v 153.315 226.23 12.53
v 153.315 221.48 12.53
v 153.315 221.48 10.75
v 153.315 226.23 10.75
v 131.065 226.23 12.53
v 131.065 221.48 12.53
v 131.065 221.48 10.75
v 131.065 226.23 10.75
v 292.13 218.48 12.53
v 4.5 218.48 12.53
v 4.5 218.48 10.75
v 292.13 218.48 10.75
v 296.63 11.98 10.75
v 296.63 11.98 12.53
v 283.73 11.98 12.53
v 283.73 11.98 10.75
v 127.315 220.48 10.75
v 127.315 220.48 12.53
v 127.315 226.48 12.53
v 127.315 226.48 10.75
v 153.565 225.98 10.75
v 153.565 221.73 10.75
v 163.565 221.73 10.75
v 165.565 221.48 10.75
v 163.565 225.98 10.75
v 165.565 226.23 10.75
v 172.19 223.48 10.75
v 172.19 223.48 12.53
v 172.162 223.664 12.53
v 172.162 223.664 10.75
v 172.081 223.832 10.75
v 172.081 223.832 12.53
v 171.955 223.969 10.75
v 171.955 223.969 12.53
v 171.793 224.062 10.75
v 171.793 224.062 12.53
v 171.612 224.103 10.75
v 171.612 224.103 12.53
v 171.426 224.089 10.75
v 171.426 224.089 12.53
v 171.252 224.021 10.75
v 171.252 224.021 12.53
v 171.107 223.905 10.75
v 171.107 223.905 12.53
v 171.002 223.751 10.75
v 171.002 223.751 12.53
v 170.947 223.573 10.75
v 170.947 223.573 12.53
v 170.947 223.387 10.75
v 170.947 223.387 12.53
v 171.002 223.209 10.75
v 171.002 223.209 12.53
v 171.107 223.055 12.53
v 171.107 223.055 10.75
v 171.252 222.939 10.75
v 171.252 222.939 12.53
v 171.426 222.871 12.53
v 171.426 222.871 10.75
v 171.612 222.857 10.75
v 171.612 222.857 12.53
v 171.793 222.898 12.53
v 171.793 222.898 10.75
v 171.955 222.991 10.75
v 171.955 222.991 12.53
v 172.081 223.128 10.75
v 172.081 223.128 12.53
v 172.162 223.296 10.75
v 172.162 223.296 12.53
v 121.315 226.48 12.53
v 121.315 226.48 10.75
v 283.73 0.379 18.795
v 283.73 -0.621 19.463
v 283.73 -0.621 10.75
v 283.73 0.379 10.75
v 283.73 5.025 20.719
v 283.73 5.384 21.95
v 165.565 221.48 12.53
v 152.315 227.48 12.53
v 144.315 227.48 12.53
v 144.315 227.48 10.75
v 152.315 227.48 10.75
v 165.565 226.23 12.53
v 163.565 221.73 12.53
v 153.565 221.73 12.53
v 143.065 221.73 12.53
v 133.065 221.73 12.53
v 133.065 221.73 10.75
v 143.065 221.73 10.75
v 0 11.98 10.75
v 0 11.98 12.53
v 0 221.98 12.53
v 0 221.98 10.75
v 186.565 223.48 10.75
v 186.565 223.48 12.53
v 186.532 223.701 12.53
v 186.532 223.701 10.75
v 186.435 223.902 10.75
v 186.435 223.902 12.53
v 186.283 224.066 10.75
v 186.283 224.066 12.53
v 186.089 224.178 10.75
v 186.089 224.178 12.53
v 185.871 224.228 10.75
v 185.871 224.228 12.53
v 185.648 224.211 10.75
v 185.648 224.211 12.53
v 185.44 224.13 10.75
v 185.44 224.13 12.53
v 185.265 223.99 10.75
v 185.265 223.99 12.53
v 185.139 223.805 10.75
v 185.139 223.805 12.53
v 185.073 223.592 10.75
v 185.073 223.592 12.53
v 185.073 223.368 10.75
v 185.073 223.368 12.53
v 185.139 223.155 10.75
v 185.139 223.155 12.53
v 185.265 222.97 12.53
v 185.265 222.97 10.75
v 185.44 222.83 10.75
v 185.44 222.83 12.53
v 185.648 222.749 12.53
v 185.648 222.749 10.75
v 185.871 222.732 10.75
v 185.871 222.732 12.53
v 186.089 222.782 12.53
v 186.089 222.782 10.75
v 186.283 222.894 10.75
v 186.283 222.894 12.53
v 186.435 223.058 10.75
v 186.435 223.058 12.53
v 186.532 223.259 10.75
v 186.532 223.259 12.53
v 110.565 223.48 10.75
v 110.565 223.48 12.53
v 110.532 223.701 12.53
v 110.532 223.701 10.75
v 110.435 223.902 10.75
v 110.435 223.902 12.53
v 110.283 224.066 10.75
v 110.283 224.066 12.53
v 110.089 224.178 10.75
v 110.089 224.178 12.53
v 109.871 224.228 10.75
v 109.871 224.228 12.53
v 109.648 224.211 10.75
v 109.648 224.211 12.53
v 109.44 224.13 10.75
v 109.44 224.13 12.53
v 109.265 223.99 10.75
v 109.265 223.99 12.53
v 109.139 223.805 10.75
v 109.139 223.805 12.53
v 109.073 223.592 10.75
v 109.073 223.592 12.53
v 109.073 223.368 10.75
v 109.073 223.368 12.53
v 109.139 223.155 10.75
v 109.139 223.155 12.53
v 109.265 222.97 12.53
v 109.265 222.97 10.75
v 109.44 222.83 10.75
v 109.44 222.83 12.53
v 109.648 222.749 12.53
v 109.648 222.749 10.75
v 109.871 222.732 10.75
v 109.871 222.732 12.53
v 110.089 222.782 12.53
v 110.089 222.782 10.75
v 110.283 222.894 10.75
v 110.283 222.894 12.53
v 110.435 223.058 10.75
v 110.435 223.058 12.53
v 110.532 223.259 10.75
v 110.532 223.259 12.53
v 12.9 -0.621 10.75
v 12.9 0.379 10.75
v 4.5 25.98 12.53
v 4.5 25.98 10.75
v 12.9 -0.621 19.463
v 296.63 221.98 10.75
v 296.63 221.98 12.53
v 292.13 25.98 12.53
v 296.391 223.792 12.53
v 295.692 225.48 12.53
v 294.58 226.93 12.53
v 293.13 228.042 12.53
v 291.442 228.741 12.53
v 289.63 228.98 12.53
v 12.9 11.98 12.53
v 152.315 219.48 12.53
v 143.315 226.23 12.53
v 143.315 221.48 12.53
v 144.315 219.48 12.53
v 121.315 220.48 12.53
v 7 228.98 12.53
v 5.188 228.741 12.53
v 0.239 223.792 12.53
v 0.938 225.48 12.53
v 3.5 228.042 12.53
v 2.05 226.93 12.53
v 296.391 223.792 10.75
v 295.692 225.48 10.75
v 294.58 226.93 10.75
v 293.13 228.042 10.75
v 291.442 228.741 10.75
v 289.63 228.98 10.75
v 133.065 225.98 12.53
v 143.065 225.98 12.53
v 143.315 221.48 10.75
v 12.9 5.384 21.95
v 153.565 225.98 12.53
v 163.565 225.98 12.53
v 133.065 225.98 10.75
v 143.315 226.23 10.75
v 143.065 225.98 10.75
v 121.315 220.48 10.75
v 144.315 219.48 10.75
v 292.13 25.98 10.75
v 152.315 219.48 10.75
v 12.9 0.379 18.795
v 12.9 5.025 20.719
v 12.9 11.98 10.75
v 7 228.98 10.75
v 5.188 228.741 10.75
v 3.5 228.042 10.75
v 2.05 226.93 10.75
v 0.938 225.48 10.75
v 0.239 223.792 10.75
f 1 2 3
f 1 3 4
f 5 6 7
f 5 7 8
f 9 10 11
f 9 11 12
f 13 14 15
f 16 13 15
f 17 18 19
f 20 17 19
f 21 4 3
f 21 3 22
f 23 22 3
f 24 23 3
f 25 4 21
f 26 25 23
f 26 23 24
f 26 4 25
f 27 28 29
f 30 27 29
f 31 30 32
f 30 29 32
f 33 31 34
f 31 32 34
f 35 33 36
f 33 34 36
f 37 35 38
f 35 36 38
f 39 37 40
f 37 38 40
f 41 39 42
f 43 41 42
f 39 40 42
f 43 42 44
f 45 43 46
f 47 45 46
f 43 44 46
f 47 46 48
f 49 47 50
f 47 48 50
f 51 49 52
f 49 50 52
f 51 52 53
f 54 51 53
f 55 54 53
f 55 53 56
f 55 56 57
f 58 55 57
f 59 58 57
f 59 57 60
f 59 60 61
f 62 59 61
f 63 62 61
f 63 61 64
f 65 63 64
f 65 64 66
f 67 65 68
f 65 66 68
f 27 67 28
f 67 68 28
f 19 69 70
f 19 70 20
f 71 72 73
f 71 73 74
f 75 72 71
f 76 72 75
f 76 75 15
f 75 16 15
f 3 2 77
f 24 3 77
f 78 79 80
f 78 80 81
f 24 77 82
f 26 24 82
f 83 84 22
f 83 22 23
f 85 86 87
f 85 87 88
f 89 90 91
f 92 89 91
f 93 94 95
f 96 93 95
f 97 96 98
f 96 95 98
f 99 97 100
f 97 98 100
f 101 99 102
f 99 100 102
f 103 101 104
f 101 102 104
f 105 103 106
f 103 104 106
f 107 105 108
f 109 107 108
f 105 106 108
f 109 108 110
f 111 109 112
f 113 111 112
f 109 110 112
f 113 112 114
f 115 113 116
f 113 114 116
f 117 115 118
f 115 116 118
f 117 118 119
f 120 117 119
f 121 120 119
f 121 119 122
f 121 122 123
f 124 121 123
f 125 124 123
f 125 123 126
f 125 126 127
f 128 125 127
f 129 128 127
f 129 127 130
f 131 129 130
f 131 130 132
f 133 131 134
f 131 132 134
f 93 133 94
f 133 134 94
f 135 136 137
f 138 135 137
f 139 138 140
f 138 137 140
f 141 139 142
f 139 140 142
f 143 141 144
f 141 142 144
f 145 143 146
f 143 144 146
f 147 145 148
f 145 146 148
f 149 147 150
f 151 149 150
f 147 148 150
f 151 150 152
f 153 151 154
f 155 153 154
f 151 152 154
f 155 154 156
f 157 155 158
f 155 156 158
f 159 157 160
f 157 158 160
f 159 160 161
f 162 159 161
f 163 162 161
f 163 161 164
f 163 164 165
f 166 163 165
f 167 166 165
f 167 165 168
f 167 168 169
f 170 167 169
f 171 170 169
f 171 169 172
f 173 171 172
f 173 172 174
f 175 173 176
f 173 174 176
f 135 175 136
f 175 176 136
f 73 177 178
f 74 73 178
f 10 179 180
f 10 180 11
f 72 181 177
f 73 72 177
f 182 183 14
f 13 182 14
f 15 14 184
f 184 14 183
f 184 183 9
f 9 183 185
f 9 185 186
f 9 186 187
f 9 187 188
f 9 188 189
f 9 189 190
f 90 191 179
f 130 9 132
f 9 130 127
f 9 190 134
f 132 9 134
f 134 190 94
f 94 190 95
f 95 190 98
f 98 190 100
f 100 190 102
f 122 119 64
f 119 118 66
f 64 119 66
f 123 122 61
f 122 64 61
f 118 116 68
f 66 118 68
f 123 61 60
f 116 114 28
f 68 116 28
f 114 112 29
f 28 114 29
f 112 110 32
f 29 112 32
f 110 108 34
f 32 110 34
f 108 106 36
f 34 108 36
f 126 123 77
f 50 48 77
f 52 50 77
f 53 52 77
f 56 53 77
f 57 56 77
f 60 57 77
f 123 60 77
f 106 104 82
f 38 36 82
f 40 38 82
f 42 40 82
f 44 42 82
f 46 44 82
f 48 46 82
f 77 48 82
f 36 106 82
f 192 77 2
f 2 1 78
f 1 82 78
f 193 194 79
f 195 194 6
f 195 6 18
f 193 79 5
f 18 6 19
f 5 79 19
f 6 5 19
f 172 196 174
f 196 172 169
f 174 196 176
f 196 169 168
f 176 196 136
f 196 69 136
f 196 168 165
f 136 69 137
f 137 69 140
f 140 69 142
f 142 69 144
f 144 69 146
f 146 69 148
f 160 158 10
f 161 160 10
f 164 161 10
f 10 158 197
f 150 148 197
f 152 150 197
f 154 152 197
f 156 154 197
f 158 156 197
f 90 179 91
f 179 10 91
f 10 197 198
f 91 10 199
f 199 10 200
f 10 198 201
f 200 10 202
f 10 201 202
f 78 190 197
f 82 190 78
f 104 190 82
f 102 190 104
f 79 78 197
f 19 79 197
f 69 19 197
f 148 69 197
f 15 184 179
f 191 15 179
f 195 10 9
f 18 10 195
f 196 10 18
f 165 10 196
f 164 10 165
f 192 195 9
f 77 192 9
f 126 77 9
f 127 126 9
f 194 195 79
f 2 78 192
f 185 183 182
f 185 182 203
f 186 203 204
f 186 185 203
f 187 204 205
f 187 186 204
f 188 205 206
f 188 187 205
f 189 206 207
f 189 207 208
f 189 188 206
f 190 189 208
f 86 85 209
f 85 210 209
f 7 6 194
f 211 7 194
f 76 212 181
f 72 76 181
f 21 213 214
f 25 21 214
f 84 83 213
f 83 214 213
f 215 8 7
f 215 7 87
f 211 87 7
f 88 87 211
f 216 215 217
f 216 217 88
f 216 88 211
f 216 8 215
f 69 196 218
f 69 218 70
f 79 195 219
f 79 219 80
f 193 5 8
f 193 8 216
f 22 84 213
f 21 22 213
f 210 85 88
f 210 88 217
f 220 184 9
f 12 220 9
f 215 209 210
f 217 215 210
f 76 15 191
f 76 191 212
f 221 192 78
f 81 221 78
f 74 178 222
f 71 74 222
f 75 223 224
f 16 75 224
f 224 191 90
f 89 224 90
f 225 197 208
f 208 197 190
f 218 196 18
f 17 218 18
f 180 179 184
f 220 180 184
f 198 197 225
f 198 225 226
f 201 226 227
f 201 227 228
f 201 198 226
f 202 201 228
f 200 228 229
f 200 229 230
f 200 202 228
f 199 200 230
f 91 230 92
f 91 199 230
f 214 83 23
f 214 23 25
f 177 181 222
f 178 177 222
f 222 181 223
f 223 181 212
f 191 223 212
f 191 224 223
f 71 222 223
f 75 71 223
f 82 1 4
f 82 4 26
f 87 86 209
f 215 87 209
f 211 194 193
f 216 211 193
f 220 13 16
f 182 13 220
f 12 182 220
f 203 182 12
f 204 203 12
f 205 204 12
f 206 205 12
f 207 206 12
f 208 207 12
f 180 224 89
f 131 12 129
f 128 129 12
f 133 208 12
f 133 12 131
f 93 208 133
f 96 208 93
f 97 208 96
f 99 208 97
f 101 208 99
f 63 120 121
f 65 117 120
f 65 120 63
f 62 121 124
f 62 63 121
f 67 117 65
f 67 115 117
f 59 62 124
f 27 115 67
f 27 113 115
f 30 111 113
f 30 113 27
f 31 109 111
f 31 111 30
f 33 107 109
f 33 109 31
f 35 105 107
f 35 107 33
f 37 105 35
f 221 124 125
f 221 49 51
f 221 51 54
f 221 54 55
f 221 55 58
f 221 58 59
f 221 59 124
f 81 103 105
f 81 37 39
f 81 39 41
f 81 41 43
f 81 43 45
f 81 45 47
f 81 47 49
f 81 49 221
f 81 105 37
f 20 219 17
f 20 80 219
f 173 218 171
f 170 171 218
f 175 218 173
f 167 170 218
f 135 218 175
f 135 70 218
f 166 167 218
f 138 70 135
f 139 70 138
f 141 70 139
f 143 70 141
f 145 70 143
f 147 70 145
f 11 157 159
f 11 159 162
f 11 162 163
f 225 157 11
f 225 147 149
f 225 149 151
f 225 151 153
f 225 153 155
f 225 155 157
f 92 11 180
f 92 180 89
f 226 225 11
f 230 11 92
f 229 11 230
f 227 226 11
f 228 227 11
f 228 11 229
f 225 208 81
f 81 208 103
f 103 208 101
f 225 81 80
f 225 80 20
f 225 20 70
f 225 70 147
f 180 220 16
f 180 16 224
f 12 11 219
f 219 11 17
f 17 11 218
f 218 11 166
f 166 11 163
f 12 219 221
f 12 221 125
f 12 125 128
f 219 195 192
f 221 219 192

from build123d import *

# Parameters (mm, degrees)
SKETCH009_R   = 0.625
SKETCH009_R_2 = 0.75
SKETCH009_W   = 287.63
SKETCH009_H   = 192.5
SKETCH009_W_2 = 8
SKETCH009_H_2 = 8
SKETCH009_W_3 = 6
SKETCH009_H_3 = 6
PAD002_DEPTH  = 1.78
SKETCH_W      = 12.25
SKETCH_H      = 4.75
SKETCH_W_2    = 10
SKETCH_H_2    = 4.25
POCKET_DEPTH  = 1.7799
PAD_START     = 12.9
PAD_DEPTH     = 270.83


with BuildPart() as part:
    # Sketch009 → Pad002 (new body)
    with BuildSketch(Plane.XY.offset(12.53)):
        with BuildLine():
            Line((7, 228.98), (289.63, 228.98))
            ThreePointArc((296.63, 221.98), (294.579747, 226.929747), (289.63, 228.98))
            Line((296.63, 221.98), (296.63, 11.98))
            Line((296.63, 11.98), (0, 11.98))
            Line((0, 11.98), (0, 221.98))
            ThreePointArc((7, 228.98), (2.050253, 226.929747), (0, 221.98))
        make_face()
        with Locations((171.565, 223.48)):
            Circle(SKETCH009_R, mode=Mode.SUBTRACT)
        with Locations((185.815, 223.48)):
            Circle(SKETCH009_R_2, mode=Mode.SUBTRACT)
        with Locations((109.815, 223.48)):
            Circle(SKETCH009_R_2, mode=Mode.SUBTRACT)
        with Locations((148.315, 122.23)):
            Rectangle(SKETCH009_W, SKETCH009_H, mode=Mode.SUBTRACT)
        with Locations((148.315, 223.48)):
            Rectangle(SKETCH009_W_2, SKETCH009_H_2, mode=Mode.SUBTRACT)
        with Locations((124.315, 223.48)):
            Rectangle(SKETCH009_W_3, SKETCH009_H_3, mode=Mode.SUBTRACT)
    extrude(amount=-PAD002_DEPTH)

    # Sketch (on Sketch) → Pocket (cut)
    with BuildSketch(Plane.XY.offset(12.53)):
        with Locations((137.19, 223.855)):
            Rectangle(SKETCH_W, SKETCH_H)
        with Locations((138.065, 223.855)):
            Rectangle(SKETCH_W_2, SKETCH_H_2, mode=Mode.SUBTRACT)
        with Locations((159.44, 223.855)):
            Rectangle(SKETCH_W, SKETCH_H)
        with Locations((158.565, 223.855)):
            Rectangle(SKETCH_W_2, SKETCH_H_2, mode=Mode.SUBTRACT)
    extrude(amount=-POCKET_DEPTH, mode=Mode.SUBTRACT)

    # Sketch010 → Pad (join)
    with BuildSketch(Plane.YZ.offset(PAD_START)):
        Polygon((11.98, 12.53), (5.383871, 21.950249), (-0.621346, 19.462806), (-0.621346, 10.75), (0.378654, 10.75), (0.378654, 18.794628), (5.025063, 20.719233), (11.98, 10.75), align=None)
    extrude(amount=PAD_DEPTH)


solid = part.part
